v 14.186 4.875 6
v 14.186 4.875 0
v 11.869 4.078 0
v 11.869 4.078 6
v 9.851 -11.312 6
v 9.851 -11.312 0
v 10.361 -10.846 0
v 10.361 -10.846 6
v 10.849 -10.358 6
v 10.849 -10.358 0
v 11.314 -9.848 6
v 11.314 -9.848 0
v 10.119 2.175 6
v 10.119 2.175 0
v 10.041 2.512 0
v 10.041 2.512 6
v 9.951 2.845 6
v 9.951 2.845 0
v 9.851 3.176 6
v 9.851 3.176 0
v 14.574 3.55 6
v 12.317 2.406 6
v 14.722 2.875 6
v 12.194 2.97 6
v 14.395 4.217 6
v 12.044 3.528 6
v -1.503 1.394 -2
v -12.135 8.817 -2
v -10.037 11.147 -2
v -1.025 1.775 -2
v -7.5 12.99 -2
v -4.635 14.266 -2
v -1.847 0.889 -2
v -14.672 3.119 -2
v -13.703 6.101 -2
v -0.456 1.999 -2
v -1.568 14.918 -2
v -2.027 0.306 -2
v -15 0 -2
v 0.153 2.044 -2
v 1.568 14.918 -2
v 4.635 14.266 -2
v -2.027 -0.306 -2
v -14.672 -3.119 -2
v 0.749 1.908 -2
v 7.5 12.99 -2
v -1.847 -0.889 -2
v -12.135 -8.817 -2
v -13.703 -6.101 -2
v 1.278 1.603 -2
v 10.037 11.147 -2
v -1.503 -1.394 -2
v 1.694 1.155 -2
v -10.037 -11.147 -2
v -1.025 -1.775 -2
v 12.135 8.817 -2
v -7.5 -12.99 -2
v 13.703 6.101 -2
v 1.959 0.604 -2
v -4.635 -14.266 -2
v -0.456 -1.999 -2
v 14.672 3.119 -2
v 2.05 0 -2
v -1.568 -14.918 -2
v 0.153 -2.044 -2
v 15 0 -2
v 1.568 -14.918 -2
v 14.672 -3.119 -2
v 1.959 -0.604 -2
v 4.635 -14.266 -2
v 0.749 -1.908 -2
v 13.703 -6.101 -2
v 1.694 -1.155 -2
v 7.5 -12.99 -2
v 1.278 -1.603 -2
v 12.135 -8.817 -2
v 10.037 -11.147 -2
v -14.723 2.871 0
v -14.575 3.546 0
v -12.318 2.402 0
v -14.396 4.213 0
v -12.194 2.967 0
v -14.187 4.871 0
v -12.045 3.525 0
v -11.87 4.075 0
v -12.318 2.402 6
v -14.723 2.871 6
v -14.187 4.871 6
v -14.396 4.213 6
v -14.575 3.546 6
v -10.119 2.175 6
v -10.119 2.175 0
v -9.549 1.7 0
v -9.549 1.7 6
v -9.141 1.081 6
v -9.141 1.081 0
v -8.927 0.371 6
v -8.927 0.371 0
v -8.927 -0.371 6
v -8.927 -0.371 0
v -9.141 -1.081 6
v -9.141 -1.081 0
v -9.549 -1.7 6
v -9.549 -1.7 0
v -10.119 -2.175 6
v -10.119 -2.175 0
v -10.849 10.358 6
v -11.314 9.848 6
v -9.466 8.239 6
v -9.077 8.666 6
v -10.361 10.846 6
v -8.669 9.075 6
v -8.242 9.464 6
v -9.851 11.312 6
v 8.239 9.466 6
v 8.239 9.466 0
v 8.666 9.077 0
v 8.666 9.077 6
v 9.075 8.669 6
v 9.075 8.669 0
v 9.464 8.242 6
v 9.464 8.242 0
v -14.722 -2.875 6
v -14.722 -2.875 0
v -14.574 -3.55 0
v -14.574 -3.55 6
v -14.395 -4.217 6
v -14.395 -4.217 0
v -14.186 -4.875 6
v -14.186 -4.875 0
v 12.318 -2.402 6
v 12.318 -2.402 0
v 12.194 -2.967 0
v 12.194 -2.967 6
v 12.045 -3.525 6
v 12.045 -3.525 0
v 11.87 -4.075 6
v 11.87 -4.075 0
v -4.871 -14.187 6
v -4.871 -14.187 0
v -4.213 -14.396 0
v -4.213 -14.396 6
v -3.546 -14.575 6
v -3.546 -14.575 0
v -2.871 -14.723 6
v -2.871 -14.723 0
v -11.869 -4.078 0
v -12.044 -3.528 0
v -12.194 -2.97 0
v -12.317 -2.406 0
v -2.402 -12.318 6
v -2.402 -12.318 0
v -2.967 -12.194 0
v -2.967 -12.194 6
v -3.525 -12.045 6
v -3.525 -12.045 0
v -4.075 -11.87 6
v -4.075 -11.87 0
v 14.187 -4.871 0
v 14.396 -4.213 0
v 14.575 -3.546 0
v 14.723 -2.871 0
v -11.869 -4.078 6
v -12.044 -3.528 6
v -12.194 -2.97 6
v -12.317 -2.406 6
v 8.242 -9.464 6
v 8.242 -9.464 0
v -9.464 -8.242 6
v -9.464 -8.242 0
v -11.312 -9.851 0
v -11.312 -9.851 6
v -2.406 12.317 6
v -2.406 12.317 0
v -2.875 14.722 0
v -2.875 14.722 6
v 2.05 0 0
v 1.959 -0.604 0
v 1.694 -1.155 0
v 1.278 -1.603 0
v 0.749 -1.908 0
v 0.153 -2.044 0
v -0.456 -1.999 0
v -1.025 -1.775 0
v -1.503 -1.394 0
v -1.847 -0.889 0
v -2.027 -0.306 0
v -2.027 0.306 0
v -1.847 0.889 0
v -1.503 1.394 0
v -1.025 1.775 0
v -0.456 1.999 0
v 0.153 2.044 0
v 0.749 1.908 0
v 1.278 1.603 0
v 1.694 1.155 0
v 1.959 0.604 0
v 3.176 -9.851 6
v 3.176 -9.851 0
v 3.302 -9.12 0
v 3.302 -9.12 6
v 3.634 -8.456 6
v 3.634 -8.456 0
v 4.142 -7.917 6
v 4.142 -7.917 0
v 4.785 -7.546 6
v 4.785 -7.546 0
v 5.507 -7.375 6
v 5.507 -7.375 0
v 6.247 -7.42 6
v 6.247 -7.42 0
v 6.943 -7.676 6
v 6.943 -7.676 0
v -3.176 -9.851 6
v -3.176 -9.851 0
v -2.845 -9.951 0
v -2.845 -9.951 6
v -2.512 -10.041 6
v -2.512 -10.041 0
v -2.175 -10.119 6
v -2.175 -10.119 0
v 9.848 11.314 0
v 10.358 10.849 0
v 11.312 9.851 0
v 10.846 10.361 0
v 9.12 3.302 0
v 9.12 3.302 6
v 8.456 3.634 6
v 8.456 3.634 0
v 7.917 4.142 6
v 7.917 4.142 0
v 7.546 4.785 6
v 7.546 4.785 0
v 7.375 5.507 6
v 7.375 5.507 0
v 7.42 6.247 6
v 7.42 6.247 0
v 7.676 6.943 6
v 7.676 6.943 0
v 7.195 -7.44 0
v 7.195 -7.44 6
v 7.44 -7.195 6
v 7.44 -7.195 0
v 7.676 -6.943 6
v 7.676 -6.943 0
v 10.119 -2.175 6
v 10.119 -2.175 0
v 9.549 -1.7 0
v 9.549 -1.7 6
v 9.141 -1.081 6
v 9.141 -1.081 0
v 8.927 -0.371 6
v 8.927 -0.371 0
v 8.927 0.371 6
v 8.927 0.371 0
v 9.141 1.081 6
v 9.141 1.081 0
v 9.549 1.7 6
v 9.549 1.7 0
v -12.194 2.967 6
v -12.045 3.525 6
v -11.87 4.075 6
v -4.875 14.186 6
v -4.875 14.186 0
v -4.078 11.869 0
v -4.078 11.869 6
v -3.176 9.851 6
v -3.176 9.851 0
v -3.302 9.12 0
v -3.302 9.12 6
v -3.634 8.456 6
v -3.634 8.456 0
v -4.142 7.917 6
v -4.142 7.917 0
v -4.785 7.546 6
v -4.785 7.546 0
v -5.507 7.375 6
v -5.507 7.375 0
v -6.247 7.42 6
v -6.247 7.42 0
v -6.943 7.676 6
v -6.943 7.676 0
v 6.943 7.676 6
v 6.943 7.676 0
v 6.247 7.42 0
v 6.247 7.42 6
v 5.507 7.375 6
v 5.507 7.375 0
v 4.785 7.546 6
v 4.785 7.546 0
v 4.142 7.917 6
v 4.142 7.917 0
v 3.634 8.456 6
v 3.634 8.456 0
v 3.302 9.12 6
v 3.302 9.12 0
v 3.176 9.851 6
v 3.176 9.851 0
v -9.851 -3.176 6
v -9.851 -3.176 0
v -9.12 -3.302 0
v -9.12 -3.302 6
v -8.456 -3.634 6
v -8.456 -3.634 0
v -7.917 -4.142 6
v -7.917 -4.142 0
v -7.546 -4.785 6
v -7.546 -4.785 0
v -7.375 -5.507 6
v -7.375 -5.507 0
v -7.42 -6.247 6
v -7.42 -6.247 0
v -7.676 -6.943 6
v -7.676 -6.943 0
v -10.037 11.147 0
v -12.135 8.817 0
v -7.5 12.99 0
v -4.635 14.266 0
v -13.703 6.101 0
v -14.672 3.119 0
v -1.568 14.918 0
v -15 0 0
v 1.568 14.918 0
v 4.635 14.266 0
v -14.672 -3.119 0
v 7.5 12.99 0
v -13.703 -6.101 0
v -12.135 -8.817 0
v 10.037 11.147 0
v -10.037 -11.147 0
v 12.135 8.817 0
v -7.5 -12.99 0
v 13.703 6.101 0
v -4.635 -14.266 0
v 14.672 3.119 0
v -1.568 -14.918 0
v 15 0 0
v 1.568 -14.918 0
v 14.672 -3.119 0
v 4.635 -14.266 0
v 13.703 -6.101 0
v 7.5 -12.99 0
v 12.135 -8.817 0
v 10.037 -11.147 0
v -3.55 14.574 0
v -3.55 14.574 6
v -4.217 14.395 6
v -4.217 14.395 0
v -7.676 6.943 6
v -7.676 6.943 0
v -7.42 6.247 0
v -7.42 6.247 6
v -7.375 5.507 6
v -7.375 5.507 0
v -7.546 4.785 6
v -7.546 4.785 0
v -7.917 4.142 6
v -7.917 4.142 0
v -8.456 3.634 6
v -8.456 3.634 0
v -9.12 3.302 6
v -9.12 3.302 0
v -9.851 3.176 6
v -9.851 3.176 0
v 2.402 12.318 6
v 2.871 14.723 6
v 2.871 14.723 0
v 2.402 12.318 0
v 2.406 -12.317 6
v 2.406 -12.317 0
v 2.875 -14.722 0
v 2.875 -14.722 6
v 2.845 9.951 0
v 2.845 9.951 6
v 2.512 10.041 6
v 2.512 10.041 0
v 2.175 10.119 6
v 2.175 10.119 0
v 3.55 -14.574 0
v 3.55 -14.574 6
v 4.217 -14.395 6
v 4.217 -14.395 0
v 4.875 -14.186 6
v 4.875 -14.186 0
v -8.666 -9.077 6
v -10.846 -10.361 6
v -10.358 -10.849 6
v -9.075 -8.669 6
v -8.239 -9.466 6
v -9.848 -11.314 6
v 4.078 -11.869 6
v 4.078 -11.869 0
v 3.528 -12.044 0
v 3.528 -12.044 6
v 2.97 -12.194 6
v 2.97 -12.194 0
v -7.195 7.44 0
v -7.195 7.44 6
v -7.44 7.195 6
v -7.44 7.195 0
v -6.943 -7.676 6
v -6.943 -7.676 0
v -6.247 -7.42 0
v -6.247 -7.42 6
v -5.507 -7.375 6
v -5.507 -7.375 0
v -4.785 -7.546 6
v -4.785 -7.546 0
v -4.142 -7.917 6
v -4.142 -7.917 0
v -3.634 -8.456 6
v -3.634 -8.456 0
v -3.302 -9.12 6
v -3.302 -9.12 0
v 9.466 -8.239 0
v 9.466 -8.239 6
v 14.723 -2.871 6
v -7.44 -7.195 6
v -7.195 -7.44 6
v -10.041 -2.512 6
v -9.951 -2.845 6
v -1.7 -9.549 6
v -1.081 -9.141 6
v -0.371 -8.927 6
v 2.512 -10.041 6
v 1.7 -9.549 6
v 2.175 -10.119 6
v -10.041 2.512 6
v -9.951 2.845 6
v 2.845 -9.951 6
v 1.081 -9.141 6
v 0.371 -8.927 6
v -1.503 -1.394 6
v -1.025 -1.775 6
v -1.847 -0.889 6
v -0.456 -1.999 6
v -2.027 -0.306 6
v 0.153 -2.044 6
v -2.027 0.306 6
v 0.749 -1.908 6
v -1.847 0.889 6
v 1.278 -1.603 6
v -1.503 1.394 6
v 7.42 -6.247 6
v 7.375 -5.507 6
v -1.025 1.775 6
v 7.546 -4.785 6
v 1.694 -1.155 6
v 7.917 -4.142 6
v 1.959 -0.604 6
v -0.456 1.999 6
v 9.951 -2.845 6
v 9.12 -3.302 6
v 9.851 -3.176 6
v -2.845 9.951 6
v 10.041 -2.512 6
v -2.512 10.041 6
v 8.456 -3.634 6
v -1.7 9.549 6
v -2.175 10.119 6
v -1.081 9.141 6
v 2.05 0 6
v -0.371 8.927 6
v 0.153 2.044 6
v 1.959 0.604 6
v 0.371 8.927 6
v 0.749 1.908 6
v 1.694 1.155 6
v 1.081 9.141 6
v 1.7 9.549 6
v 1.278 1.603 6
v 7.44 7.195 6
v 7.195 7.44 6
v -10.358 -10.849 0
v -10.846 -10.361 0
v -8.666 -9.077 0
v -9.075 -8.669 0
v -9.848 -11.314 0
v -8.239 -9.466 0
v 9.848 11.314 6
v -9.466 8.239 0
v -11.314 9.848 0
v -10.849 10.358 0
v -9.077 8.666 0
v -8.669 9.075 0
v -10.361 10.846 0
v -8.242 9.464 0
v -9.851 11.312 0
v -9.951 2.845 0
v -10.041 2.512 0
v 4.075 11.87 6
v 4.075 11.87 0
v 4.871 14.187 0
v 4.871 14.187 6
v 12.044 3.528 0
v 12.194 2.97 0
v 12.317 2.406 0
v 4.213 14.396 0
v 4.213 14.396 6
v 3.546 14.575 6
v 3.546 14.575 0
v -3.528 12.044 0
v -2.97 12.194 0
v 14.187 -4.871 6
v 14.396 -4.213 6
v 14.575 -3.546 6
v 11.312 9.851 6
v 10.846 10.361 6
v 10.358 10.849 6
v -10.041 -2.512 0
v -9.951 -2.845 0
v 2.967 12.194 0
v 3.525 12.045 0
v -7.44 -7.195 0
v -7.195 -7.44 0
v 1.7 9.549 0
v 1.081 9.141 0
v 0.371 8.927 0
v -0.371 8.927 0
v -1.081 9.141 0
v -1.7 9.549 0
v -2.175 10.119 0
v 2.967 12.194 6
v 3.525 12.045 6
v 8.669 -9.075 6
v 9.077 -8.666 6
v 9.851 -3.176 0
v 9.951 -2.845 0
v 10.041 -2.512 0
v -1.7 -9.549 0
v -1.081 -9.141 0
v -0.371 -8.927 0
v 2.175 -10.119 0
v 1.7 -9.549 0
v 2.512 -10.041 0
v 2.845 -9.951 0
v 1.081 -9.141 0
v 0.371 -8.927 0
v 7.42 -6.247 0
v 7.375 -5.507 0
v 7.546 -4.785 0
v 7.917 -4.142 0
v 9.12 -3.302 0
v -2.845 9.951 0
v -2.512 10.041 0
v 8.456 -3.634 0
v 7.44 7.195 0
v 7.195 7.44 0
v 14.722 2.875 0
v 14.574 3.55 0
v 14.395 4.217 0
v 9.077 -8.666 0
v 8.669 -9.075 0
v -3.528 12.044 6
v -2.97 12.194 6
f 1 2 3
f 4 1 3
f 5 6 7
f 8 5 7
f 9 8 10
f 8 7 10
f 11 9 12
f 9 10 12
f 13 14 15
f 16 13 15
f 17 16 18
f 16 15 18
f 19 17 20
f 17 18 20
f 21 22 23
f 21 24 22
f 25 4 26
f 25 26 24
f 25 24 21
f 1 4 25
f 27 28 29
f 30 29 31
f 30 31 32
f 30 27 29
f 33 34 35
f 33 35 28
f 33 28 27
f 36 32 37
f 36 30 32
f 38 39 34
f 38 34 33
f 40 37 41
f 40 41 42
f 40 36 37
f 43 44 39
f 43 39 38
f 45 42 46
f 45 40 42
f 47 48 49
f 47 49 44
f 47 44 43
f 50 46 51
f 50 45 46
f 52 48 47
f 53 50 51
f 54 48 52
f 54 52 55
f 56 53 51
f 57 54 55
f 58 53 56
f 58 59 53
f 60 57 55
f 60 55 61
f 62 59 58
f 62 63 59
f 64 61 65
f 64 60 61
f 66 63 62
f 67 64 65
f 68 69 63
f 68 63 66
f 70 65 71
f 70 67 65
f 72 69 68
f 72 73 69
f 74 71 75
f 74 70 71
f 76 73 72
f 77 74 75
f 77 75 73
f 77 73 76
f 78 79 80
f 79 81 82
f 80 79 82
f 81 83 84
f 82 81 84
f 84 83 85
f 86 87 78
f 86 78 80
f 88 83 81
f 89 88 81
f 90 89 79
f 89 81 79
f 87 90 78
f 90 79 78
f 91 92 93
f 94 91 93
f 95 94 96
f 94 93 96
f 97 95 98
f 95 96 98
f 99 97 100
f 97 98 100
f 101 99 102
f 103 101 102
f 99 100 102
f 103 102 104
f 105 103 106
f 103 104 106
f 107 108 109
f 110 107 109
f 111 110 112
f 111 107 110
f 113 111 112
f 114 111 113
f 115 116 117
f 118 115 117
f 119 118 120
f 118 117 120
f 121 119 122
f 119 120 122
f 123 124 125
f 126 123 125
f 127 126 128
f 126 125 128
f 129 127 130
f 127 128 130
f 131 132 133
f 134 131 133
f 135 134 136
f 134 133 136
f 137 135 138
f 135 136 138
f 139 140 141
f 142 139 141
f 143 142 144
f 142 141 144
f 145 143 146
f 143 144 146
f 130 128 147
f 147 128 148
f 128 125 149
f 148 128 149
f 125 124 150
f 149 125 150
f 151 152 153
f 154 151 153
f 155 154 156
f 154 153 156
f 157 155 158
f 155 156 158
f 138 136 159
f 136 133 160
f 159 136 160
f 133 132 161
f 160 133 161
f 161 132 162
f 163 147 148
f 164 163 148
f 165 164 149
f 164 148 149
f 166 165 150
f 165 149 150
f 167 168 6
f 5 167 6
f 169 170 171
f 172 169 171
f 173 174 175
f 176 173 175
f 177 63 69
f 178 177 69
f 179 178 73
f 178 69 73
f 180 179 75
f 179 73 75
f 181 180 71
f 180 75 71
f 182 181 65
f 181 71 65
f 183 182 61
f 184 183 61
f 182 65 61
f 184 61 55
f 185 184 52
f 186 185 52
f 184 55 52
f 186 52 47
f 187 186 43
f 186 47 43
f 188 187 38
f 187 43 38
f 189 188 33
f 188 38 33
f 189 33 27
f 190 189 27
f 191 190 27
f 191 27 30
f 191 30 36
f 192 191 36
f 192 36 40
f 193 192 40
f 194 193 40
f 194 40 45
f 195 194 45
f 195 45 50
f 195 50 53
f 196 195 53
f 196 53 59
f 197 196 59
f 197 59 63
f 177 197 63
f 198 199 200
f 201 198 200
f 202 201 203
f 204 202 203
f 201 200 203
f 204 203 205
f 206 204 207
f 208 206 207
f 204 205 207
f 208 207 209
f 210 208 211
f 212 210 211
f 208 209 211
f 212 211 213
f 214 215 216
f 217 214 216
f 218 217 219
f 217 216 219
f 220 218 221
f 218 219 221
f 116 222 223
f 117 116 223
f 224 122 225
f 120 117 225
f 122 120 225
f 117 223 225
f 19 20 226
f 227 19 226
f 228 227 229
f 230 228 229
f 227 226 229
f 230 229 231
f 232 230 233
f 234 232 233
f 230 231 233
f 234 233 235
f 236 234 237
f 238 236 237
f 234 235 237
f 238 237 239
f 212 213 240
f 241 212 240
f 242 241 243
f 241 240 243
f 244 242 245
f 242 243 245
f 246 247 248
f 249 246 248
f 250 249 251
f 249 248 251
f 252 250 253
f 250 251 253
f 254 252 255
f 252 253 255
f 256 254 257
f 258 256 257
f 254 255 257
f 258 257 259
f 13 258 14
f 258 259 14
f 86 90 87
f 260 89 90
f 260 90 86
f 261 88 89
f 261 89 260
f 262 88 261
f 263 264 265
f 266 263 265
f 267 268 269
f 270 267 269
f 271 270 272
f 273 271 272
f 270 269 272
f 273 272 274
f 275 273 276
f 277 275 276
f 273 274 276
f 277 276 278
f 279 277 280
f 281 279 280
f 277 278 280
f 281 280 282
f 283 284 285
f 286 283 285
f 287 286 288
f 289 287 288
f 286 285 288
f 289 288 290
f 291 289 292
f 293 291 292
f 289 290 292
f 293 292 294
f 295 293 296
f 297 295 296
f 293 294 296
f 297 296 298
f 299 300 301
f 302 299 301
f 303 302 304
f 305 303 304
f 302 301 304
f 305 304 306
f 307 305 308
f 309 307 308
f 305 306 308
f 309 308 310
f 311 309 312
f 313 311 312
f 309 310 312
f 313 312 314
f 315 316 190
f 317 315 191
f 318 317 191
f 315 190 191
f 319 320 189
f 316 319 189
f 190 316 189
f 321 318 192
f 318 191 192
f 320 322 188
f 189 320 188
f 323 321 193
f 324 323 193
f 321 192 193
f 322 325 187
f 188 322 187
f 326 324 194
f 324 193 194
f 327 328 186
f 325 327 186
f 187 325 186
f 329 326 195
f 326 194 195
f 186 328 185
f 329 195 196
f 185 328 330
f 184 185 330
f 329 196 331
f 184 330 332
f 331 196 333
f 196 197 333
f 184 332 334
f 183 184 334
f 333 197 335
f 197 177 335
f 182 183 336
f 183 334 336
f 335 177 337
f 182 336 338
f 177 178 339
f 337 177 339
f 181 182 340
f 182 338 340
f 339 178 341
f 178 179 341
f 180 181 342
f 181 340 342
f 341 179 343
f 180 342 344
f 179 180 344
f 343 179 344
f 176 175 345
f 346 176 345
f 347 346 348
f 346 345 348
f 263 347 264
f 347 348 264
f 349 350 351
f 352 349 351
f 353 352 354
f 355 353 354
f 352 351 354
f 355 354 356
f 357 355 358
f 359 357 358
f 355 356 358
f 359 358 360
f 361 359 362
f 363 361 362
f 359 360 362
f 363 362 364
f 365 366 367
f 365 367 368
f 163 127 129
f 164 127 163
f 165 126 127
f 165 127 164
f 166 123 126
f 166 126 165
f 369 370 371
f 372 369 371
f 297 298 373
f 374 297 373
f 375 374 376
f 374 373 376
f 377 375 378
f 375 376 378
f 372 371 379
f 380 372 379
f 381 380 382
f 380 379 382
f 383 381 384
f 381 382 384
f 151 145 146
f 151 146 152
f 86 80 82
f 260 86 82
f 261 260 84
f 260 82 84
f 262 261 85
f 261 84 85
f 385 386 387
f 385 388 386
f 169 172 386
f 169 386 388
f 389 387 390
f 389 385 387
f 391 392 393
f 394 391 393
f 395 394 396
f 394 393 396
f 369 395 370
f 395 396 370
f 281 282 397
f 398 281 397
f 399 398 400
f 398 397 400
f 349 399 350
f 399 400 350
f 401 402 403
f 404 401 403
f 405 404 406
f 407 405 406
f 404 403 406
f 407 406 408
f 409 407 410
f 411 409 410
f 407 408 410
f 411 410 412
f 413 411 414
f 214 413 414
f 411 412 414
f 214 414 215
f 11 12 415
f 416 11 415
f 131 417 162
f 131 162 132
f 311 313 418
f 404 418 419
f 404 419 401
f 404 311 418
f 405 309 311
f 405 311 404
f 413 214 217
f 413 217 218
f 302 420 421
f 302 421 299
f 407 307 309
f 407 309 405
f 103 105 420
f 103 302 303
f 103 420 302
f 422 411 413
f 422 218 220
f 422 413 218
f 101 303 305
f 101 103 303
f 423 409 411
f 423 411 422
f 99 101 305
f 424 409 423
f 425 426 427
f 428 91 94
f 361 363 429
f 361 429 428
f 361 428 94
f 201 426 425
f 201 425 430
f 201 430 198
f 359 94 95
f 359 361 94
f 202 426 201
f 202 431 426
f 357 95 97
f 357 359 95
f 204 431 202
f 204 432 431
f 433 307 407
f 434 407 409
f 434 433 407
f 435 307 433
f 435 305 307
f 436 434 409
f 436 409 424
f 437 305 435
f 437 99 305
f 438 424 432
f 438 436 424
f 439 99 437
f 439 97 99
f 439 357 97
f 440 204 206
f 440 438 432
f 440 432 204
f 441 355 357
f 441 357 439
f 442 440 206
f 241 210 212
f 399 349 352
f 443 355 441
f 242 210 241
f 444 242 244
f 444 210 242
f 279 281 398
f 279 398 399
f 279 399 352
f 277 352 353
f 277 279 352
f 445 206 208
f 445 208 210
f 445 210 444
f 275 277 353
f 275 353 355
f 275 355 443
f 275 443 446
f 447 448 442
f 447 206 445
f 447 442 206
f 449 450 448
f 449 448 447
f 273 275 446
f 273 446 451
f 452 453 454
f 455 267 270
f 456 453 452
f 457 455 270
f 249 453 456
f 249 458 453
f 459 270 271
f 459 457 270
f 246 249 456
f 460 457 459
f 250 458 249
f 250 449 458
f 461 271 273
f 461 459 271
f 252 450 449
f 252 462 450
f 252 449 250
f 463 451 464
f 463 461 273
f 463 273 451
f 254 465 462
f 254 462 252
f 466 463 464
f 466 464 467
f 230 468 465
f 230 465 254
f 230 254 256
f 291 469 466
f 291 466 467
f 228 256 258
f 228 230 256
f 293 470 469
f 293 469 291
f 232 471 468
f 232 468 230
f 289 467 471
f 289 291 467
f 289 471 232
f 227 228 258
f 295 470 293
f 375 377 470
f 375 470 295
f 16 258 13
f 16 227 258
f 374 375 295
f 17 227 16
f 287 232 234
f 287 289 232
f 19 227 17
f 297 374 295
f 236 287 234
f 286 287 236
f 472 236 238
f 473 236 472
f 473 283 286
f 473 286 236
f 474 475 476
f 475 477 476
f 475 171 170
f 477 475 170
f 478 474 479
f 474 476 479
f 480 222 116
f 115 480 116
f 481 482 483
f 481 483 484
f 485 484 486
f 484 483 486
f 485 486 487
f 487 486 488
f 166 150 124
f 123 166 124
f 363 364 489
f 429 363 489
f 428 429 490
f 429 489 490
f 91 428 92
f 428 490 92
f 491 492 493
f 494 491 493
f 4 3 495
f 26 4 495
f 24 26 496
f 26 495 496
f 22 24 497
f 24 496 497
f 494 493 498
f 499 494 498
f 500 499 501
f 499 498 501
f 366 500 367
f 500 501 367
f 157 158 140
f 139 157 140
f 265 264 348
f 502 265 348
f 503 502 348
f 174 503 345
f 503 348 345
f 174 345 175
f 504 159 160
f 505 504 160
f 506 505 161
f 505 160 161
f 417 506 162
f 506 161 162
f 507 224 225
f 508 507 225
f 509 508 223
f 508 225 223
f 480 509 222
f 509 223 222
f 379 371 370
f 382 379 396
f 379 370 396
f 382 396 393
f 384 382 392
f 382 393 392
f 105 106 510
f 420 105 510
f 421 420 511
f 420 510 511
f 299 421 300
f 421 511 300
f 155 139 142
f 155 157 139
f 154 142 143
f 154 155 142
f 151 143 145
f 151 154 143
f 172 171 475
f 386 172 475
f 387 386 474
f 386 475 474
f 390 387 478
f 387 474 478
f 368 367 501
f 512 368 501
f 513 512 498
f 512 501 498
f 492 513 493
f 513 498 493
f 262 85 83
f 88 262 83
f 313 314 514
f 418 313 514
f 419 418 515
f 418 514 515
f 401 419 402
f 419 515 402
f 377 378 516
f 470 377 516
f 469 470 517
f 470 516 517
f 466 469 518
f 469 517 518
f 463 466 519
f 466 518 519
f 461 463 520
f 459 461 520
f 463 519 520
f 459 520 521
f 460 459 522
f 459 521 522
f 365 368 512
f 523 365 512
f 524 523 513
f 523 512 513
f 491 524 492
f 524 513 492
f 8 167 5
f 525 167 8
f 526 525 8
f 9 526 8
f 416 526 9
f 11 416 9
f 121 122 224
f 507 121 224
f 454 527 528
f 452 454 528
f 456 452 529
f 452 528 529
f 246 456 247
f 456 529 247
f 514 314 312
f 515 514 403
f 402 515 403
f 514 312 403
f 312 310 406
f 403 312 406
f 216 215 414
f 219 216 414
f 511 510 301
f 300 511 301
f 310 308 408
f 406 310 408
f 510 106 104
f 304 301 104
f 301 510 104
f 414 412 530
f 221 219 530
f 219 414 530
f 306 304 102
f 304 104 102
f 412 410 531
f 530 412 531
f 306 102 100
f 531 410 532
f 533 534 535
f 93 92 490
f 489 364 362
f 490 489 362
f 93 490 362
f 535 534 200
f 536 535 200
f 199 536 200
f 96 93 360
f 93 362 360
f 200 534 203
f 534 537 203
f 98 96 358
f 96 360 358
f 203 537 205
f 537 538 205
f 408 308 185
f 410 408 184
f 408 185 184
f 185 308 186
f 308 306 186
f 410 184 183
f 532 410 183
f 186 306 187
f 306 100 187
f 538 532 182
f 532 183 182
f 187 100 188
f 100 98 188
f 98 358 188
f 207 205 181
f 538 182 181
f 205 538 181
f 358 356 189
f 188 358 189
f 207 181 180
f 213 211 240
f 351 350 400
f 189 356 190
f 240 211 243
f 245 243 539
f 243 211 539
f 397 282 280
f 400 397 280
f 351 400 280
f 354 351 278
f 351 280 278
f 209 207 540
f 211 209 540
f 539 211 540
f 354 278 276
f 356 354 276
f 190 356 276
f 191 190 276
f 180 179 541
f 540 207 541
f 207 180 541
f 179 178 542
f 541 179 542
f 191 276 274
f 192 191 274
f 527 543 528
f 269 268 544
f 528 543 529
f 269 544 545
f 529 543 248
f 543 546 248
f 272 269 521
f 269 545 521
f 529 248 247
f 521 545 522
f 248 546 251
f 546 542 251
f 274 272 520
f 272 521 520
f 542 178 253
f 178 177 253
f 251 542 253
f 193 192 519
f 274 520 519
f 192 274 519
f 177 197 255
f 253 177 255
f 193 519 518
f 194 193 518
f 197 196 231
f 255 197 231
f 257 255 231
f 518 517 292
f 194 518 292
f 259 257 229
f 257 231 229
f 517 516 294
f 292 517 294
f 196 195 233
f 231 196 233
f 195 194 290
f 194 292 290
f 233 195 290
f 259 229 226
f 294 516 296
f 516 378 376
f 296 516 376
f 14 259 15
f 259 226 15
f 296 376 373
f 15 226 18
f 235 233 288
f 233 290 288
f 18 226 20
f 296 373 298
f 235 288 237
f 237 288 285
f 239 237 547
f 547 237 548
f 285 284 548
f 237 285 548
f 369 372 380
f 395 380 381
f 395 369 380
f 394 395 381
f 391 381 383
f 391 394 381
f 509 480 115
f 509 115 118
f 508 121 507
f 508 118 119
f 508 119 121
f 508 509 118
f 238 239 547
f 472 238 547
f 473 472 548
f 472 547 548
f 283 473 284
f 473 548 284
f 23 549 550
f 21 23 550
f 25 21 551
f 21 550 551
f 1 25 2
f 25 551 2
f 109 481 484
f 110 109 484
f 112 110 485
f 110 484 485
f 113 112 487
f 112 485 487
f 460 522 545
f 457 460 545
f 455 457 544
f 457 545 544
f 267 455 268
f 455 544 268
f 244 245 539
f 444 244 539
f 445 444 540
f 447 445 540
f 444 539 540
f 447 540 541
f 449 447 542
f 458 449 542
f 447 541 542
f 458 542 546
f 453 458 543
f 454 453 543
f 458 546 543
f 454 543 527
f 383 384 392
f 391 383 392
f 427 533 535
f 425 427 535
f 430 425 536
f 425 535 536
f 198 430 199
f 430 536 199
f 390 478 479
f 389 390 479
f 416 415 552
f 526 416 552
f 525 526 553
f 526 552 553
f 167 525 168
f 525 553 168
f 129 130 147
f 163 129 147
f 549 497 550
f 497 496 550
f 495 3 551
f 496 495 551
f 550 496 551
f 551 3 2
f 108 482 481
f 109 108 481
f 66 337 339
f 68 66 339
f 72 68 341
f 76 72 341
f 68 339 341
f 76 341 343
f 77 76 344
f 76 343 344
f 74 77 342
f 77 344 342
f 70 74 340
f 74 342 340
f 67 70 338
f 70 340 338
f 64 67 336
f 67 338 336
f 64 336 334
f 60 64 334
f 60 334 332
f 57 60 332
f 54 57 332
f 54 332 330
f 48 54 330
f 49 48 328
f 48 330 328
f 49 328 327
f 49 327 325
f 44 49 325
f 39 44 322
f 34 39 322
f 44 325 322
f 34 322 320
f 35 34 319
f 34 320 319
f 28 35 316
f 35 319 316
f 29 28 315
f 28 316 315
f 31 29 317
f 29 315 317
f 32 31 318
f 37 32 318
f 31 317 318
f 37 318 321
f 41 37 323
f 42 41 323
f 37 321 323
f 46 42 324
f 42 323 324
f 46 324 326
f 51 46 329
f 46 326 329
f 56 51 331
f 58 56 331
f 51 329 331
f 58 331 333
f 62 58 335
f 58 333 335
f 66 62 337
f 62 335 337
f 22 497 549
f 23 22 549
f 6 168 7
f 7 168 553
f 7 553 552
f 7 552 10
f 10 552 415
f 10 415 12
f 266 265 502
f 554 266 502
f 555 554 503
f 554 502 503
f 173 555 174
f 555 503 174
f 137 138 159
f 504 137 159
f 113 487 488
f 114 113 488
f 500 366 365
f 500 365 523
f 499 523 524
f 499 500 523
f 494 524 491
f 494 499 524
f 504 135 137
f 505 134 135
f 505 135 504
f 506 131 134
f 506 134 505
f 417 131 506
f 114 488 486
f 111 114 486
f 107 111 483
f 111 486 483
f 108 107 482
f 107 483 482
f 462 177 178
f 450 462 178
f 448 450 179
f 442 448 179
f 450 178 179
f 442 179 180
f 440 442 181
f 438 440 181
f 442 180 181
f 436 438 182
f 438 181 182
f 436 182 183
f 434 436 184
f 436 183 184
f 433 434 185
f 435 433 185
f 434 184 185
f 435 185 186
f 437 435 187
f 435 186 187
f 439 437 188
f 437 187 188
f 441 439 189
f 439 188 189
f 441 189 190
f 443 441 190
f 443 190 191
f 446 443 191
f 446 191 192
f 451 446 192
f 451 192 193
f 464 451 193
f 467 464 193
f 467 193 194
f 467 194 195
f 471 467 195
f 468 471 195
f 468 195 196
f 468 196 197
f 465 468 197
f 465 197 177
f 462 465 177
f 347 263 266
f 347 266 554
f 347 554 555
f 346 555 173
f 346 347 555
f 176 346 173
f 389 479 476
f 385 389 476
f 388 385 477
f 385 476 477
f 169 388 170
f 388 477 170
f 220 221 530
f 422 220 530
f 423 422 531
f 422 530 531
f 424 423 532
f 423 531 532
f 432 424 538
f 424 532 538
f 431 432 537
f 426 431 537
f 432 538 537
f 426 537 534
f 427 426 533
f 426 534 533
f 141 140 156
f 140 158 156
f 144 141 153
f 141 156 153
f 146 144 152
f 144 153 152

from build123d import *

# Parameters (mm, degrees)
F1_DEPTH = 6
F2_R     = 15
F3_DEPTH = 2
F4_R     = 2.05
F5_DEPTH = 8.001


with BuildPart() as f1:
    # F0 (on Top) → F1 (new body)
    with BuildSketch(Plane.XY):
        with BuildLine():
            ThreePointArc((-7.675711, 6.943051), (-7.707626, 4.45), (-9.850714, 3.175836))
            ThreePointArc((-9.850714, 3.175836), (-9.997332, 2.678777), (-10.118886, 2.175003))
            ThreePointArc((-10.118886, 2.175003), (-8.9, 0), (-10.118886, -2.175003))
            ThreePointArc((-10.118886, -2.175003), (-9.997332, -2.678777), (-9.850714, -3.175836))
            ThreePointArc((-9.850714, -3.175836), (-7.707626, -4.45), (-7.675711, -6.943051))
            ThreePointArc((-7.675711, -6.943051), (-7.318555, -7.318555), (-6.943051, -7.675711))
            ThreePointArc((-6.943051, -7.675711), (-4.45, -7.707626), (-3.175836, -9.850714))
            ThreePointArc((-3.175836, -9.850714), (-2.678777, -9.997332), (-2.175003, -10.118886))
            ThreePointArc((-2.175003, -10.118886), (0, -8.9), (2.175003, -10.118886))
            ThreePointArc((2.175003, -10.118886), (2.678777, -9.997332), (3.175836, -9.850714))
            ThreePointArc((3.175836, -9.850714), (4.45, -7.707626), (6.943051, -7.675711))
            ThreePointArc((6.943051, -7.675711), (7.318555, -7.318555), (7.675711, -6.943051))
            ThreePointArc((7.675711, -6.943051), (7.707626, -4.45), (9.850714, -3.175836))
            ThreePointArc((9.850714, -3.175836), (9.997332, -2.678777), (10.118886, -2.175003))
            ThreePointArc((10.118886, -2.175003), (8.9, 0), (10.118886, 2.175003))
            ThreePointArc((10.118886, 2.175003), (9.997332, 2.678777), (9.850714, 3.175836))
            ThreePointArc((9.850714, 3.175836), (7.707626, 4.45), (7.675711, 6.943051))
            ThreePointArc((7.675711, 6.943051), (7.318555, 7.318555), (6.943051, 7.675711))
            ThreePointArc((6.943051, 7.675711), (4.45, 7.707626), (3.175836, 9.850714))
            ThreePointArc((3.175836, 9.850714), (2.678777, 9.997332), (2.175003, 10.118886))
            ThreePointArc((2.175003, 10.118886), (0, 8.9), (-2.175003, 10.118886))
            ThreePointArc((-2.175003, 10.118886), (-2.678777, 9.997332), (-3.175836, 9.850714))
            ThreePointArc((-3.175836, 9.850714), (-4.45, 7.707626), (-6.943051, 7.675711))
            ThreePointArc((-6.943051, 7.675711), (-7.318555, 7.318555), (-7.675711, 6.943051))
        make_face()
        with BuildLine():
            ThreePointArc((-14.721821, -2.87541), (-14.488354, -3.884274), (-14.185839, -4.874626))
            Line((-14.185839, -4.874626), (-11.868818, -4.078437))
            ThreePointArc((-11.868818, -4.078437), (-12.121923, -3.249843), (-12.317257, -2.40576))
            Line((-12.317257, -2.40576), (-14.721821, -2.87541))
        make_face()
        with BuildLine():
            Line((-11.869937, 4.075179), (-14.187176, 4.870732))
            ThreePointArc((-14.187176, 4.870732), (-14.48942, 3.880297), (-14.72261, 2.871369))
            Line((-14.72261, 2.871369), (-12.317917, 2.402379))
            ThreePointArc((-12.317917, 2.402379), (-12.122815, 3.246515), (-11.869937, 4.075179))
        make_face()
        with BuildLine():
            Line((-8.242078, 9.464177), (-9.851089, 11.311766))
            ThreePointArc((-9.851089, 11.311766), (-10.608057, 10.605146), (-11.31447, 9.847984))
            Line((-11.31447, 9.847984), (-9.466439, 8.23948))
            ThreePointArc((-9.466439, 8.23948), (-8.875408, 8.872972), (-8.242078, 9.464177))
        make_face()
        with BuildLine():
            Line((-2.40576, 12.317257), (-2.87541, 14.721821))
            ThreePointArc((-2.87541, 14.721821), (-3.884274, 14.488354), (-4.874626, 14.185839))
            Line((-4.874626, 14.185839), (-4.078437, 11.868818))
            ThreePointArc((-4.078437, 11.868818), (-3.249843, 12.121923), (-2.40576, 12.317257))
        make_face()
        with BuildLine():
            Line((4.075179, 11.869937), (4.870732, 14.187176))
            ThreePointArc((4.870732, 14.187176), (3.880297, 14.48942), (2.871369, 14.72261))
            Line((2.871369, 14.72261), (2.402379, 12.317917))
            ThreePointArc((2.402379, 12.317917), (3.246515, 12.122815), (4.075179, 11.869937))
        make_face()
        with BuildLine():
            Line((9.464177, 8.242078), (11.311766, 9.851089))
            ThreePointArc((11.311766, 9.851089), (10.605146, 10.608057), (9.847984, 11.31447))
            Line((9.847984, 11.31447), (8.23948, 9.466439))
            ThreePointArc((8.23948, 9.466439), (8.872972, 8.875408), (9.464177, 8.242078))
        make_face()
        with BuildLine():
            Line((12.317257, 2.40576), (14.721821, 2.87541))
            ThreePointArc((14.721821, 2.87541), (14.488354, 3.884274), (14.185839, 4.874626))
            Line((14.185839, 4.874626), (11.868818, 4.078437))
            ThreePointArc((11.868818, 4.078437), (12.121923, 3.249843), (12.317257, 2.40576))
        make_face()
        with BuildLine():
            ThreePointArc((14.187176, -4.870732), (14.48942, -3.880297), (14.72261, -2.871369))
            Line((14.72261, -2.871369), (12.317917, -2.402379))
            ThreePointArc((12.317917, -2.402379), (12.122815, -3.246515), (11.869937, -4.075179))
            Line((11.869937, -4.075179), (14.187176, -4.870732))
        make_face()
        with BuildLine():
            ThreePointArc((9.851089, -11.311766), (10.608057, -10.605146), (11.31447, -9.847984))
            Line((11.31447, -9.847984), (9.466439, -8.23948))
            ThreePointArc((9.466439, -8.23948), (8.875408, -8.872972), (8.242078, -9.464177))
            Line((8.242078, -9.464177), (9.851089, -11.311766))
        make_face()
        with BuildLine():
            ThreePointArc((2.87541, -14.721821), (3.884274, -14.488354), (4.874626, -14.185839))
            Line((4.874626, -14.185839), (4.078437, -11.868818))
            ThreePointArc((4.078437, -11.868818), (3.249843, -12.121923), (2.40576, -12.317257))
            Line((2.40576, -12.317257), (2.87541, -14.721821))
        make_face()
        with BuildLine():
            ThreePointArc((-4.870732, -14.187176), (-3.880297, -14.48942), (-2.871369, -14.72261))
            Line((-2.871369, -14.72261), (-2.402379, -12.317917))
            ThreePointArc((-2.402379, -12.317917), (-3.246515, -12.122815), (-4.075179, -11.869937))
            Line((-4.075179, -11.869937), (-4.870732, -14.187176))
        make_face()
        with BuildLine():
            ThreePointArc((-11.311766, -9.851089), (-10.605146, -10.608057), (-9.847984, -11.31447))
            Line((-9.847984, -11.31447), (-8.23948, -9.466439))
            ThreePointArc((-8.23948, -9.466439), (-8.872972, -8.875408), (-9.464177, -8.242078))
            Line((-9.464177, -8.242078), (-11.311766, -9.851089))
        make_face()
    extrude(amount=F1_DEPTH)


with BuildPart() as f3:
    # F2 (on face) → F3 (new body)
    with BuildSketch(Plane(origin=(0, 0, 0), x_dir=(1, 0, 0), z_dir=(0, 0, -1))):
        Circle(F2_R)
    extrude(amount=F3_DEPTH)


with BuildPart() as f5_tool:
    # F4 (on face) → F5 (new body, through all)
    with BuildSketch(Plane(origin=(0, 0, -2), x_dir=(1, 0, 0), z_dir=(0, 0, -1))):
        Circle(F4_R)
    extrude(amount=-F5_DEPTH)


with BuildPart() as f1_1:
    add(f1.part)

    # F5: cut by f5_tool
    add(f5_tool.part, mode=Mode.SUBTRACT)


with BuildPart() as f3_1:
    add(f3.part)

    # F5: cut by f5_tool
    add(f5_tool.part, mode=Mode.SUBTRACT)


solid = Compound([f1_1.part, f3_1.part])
